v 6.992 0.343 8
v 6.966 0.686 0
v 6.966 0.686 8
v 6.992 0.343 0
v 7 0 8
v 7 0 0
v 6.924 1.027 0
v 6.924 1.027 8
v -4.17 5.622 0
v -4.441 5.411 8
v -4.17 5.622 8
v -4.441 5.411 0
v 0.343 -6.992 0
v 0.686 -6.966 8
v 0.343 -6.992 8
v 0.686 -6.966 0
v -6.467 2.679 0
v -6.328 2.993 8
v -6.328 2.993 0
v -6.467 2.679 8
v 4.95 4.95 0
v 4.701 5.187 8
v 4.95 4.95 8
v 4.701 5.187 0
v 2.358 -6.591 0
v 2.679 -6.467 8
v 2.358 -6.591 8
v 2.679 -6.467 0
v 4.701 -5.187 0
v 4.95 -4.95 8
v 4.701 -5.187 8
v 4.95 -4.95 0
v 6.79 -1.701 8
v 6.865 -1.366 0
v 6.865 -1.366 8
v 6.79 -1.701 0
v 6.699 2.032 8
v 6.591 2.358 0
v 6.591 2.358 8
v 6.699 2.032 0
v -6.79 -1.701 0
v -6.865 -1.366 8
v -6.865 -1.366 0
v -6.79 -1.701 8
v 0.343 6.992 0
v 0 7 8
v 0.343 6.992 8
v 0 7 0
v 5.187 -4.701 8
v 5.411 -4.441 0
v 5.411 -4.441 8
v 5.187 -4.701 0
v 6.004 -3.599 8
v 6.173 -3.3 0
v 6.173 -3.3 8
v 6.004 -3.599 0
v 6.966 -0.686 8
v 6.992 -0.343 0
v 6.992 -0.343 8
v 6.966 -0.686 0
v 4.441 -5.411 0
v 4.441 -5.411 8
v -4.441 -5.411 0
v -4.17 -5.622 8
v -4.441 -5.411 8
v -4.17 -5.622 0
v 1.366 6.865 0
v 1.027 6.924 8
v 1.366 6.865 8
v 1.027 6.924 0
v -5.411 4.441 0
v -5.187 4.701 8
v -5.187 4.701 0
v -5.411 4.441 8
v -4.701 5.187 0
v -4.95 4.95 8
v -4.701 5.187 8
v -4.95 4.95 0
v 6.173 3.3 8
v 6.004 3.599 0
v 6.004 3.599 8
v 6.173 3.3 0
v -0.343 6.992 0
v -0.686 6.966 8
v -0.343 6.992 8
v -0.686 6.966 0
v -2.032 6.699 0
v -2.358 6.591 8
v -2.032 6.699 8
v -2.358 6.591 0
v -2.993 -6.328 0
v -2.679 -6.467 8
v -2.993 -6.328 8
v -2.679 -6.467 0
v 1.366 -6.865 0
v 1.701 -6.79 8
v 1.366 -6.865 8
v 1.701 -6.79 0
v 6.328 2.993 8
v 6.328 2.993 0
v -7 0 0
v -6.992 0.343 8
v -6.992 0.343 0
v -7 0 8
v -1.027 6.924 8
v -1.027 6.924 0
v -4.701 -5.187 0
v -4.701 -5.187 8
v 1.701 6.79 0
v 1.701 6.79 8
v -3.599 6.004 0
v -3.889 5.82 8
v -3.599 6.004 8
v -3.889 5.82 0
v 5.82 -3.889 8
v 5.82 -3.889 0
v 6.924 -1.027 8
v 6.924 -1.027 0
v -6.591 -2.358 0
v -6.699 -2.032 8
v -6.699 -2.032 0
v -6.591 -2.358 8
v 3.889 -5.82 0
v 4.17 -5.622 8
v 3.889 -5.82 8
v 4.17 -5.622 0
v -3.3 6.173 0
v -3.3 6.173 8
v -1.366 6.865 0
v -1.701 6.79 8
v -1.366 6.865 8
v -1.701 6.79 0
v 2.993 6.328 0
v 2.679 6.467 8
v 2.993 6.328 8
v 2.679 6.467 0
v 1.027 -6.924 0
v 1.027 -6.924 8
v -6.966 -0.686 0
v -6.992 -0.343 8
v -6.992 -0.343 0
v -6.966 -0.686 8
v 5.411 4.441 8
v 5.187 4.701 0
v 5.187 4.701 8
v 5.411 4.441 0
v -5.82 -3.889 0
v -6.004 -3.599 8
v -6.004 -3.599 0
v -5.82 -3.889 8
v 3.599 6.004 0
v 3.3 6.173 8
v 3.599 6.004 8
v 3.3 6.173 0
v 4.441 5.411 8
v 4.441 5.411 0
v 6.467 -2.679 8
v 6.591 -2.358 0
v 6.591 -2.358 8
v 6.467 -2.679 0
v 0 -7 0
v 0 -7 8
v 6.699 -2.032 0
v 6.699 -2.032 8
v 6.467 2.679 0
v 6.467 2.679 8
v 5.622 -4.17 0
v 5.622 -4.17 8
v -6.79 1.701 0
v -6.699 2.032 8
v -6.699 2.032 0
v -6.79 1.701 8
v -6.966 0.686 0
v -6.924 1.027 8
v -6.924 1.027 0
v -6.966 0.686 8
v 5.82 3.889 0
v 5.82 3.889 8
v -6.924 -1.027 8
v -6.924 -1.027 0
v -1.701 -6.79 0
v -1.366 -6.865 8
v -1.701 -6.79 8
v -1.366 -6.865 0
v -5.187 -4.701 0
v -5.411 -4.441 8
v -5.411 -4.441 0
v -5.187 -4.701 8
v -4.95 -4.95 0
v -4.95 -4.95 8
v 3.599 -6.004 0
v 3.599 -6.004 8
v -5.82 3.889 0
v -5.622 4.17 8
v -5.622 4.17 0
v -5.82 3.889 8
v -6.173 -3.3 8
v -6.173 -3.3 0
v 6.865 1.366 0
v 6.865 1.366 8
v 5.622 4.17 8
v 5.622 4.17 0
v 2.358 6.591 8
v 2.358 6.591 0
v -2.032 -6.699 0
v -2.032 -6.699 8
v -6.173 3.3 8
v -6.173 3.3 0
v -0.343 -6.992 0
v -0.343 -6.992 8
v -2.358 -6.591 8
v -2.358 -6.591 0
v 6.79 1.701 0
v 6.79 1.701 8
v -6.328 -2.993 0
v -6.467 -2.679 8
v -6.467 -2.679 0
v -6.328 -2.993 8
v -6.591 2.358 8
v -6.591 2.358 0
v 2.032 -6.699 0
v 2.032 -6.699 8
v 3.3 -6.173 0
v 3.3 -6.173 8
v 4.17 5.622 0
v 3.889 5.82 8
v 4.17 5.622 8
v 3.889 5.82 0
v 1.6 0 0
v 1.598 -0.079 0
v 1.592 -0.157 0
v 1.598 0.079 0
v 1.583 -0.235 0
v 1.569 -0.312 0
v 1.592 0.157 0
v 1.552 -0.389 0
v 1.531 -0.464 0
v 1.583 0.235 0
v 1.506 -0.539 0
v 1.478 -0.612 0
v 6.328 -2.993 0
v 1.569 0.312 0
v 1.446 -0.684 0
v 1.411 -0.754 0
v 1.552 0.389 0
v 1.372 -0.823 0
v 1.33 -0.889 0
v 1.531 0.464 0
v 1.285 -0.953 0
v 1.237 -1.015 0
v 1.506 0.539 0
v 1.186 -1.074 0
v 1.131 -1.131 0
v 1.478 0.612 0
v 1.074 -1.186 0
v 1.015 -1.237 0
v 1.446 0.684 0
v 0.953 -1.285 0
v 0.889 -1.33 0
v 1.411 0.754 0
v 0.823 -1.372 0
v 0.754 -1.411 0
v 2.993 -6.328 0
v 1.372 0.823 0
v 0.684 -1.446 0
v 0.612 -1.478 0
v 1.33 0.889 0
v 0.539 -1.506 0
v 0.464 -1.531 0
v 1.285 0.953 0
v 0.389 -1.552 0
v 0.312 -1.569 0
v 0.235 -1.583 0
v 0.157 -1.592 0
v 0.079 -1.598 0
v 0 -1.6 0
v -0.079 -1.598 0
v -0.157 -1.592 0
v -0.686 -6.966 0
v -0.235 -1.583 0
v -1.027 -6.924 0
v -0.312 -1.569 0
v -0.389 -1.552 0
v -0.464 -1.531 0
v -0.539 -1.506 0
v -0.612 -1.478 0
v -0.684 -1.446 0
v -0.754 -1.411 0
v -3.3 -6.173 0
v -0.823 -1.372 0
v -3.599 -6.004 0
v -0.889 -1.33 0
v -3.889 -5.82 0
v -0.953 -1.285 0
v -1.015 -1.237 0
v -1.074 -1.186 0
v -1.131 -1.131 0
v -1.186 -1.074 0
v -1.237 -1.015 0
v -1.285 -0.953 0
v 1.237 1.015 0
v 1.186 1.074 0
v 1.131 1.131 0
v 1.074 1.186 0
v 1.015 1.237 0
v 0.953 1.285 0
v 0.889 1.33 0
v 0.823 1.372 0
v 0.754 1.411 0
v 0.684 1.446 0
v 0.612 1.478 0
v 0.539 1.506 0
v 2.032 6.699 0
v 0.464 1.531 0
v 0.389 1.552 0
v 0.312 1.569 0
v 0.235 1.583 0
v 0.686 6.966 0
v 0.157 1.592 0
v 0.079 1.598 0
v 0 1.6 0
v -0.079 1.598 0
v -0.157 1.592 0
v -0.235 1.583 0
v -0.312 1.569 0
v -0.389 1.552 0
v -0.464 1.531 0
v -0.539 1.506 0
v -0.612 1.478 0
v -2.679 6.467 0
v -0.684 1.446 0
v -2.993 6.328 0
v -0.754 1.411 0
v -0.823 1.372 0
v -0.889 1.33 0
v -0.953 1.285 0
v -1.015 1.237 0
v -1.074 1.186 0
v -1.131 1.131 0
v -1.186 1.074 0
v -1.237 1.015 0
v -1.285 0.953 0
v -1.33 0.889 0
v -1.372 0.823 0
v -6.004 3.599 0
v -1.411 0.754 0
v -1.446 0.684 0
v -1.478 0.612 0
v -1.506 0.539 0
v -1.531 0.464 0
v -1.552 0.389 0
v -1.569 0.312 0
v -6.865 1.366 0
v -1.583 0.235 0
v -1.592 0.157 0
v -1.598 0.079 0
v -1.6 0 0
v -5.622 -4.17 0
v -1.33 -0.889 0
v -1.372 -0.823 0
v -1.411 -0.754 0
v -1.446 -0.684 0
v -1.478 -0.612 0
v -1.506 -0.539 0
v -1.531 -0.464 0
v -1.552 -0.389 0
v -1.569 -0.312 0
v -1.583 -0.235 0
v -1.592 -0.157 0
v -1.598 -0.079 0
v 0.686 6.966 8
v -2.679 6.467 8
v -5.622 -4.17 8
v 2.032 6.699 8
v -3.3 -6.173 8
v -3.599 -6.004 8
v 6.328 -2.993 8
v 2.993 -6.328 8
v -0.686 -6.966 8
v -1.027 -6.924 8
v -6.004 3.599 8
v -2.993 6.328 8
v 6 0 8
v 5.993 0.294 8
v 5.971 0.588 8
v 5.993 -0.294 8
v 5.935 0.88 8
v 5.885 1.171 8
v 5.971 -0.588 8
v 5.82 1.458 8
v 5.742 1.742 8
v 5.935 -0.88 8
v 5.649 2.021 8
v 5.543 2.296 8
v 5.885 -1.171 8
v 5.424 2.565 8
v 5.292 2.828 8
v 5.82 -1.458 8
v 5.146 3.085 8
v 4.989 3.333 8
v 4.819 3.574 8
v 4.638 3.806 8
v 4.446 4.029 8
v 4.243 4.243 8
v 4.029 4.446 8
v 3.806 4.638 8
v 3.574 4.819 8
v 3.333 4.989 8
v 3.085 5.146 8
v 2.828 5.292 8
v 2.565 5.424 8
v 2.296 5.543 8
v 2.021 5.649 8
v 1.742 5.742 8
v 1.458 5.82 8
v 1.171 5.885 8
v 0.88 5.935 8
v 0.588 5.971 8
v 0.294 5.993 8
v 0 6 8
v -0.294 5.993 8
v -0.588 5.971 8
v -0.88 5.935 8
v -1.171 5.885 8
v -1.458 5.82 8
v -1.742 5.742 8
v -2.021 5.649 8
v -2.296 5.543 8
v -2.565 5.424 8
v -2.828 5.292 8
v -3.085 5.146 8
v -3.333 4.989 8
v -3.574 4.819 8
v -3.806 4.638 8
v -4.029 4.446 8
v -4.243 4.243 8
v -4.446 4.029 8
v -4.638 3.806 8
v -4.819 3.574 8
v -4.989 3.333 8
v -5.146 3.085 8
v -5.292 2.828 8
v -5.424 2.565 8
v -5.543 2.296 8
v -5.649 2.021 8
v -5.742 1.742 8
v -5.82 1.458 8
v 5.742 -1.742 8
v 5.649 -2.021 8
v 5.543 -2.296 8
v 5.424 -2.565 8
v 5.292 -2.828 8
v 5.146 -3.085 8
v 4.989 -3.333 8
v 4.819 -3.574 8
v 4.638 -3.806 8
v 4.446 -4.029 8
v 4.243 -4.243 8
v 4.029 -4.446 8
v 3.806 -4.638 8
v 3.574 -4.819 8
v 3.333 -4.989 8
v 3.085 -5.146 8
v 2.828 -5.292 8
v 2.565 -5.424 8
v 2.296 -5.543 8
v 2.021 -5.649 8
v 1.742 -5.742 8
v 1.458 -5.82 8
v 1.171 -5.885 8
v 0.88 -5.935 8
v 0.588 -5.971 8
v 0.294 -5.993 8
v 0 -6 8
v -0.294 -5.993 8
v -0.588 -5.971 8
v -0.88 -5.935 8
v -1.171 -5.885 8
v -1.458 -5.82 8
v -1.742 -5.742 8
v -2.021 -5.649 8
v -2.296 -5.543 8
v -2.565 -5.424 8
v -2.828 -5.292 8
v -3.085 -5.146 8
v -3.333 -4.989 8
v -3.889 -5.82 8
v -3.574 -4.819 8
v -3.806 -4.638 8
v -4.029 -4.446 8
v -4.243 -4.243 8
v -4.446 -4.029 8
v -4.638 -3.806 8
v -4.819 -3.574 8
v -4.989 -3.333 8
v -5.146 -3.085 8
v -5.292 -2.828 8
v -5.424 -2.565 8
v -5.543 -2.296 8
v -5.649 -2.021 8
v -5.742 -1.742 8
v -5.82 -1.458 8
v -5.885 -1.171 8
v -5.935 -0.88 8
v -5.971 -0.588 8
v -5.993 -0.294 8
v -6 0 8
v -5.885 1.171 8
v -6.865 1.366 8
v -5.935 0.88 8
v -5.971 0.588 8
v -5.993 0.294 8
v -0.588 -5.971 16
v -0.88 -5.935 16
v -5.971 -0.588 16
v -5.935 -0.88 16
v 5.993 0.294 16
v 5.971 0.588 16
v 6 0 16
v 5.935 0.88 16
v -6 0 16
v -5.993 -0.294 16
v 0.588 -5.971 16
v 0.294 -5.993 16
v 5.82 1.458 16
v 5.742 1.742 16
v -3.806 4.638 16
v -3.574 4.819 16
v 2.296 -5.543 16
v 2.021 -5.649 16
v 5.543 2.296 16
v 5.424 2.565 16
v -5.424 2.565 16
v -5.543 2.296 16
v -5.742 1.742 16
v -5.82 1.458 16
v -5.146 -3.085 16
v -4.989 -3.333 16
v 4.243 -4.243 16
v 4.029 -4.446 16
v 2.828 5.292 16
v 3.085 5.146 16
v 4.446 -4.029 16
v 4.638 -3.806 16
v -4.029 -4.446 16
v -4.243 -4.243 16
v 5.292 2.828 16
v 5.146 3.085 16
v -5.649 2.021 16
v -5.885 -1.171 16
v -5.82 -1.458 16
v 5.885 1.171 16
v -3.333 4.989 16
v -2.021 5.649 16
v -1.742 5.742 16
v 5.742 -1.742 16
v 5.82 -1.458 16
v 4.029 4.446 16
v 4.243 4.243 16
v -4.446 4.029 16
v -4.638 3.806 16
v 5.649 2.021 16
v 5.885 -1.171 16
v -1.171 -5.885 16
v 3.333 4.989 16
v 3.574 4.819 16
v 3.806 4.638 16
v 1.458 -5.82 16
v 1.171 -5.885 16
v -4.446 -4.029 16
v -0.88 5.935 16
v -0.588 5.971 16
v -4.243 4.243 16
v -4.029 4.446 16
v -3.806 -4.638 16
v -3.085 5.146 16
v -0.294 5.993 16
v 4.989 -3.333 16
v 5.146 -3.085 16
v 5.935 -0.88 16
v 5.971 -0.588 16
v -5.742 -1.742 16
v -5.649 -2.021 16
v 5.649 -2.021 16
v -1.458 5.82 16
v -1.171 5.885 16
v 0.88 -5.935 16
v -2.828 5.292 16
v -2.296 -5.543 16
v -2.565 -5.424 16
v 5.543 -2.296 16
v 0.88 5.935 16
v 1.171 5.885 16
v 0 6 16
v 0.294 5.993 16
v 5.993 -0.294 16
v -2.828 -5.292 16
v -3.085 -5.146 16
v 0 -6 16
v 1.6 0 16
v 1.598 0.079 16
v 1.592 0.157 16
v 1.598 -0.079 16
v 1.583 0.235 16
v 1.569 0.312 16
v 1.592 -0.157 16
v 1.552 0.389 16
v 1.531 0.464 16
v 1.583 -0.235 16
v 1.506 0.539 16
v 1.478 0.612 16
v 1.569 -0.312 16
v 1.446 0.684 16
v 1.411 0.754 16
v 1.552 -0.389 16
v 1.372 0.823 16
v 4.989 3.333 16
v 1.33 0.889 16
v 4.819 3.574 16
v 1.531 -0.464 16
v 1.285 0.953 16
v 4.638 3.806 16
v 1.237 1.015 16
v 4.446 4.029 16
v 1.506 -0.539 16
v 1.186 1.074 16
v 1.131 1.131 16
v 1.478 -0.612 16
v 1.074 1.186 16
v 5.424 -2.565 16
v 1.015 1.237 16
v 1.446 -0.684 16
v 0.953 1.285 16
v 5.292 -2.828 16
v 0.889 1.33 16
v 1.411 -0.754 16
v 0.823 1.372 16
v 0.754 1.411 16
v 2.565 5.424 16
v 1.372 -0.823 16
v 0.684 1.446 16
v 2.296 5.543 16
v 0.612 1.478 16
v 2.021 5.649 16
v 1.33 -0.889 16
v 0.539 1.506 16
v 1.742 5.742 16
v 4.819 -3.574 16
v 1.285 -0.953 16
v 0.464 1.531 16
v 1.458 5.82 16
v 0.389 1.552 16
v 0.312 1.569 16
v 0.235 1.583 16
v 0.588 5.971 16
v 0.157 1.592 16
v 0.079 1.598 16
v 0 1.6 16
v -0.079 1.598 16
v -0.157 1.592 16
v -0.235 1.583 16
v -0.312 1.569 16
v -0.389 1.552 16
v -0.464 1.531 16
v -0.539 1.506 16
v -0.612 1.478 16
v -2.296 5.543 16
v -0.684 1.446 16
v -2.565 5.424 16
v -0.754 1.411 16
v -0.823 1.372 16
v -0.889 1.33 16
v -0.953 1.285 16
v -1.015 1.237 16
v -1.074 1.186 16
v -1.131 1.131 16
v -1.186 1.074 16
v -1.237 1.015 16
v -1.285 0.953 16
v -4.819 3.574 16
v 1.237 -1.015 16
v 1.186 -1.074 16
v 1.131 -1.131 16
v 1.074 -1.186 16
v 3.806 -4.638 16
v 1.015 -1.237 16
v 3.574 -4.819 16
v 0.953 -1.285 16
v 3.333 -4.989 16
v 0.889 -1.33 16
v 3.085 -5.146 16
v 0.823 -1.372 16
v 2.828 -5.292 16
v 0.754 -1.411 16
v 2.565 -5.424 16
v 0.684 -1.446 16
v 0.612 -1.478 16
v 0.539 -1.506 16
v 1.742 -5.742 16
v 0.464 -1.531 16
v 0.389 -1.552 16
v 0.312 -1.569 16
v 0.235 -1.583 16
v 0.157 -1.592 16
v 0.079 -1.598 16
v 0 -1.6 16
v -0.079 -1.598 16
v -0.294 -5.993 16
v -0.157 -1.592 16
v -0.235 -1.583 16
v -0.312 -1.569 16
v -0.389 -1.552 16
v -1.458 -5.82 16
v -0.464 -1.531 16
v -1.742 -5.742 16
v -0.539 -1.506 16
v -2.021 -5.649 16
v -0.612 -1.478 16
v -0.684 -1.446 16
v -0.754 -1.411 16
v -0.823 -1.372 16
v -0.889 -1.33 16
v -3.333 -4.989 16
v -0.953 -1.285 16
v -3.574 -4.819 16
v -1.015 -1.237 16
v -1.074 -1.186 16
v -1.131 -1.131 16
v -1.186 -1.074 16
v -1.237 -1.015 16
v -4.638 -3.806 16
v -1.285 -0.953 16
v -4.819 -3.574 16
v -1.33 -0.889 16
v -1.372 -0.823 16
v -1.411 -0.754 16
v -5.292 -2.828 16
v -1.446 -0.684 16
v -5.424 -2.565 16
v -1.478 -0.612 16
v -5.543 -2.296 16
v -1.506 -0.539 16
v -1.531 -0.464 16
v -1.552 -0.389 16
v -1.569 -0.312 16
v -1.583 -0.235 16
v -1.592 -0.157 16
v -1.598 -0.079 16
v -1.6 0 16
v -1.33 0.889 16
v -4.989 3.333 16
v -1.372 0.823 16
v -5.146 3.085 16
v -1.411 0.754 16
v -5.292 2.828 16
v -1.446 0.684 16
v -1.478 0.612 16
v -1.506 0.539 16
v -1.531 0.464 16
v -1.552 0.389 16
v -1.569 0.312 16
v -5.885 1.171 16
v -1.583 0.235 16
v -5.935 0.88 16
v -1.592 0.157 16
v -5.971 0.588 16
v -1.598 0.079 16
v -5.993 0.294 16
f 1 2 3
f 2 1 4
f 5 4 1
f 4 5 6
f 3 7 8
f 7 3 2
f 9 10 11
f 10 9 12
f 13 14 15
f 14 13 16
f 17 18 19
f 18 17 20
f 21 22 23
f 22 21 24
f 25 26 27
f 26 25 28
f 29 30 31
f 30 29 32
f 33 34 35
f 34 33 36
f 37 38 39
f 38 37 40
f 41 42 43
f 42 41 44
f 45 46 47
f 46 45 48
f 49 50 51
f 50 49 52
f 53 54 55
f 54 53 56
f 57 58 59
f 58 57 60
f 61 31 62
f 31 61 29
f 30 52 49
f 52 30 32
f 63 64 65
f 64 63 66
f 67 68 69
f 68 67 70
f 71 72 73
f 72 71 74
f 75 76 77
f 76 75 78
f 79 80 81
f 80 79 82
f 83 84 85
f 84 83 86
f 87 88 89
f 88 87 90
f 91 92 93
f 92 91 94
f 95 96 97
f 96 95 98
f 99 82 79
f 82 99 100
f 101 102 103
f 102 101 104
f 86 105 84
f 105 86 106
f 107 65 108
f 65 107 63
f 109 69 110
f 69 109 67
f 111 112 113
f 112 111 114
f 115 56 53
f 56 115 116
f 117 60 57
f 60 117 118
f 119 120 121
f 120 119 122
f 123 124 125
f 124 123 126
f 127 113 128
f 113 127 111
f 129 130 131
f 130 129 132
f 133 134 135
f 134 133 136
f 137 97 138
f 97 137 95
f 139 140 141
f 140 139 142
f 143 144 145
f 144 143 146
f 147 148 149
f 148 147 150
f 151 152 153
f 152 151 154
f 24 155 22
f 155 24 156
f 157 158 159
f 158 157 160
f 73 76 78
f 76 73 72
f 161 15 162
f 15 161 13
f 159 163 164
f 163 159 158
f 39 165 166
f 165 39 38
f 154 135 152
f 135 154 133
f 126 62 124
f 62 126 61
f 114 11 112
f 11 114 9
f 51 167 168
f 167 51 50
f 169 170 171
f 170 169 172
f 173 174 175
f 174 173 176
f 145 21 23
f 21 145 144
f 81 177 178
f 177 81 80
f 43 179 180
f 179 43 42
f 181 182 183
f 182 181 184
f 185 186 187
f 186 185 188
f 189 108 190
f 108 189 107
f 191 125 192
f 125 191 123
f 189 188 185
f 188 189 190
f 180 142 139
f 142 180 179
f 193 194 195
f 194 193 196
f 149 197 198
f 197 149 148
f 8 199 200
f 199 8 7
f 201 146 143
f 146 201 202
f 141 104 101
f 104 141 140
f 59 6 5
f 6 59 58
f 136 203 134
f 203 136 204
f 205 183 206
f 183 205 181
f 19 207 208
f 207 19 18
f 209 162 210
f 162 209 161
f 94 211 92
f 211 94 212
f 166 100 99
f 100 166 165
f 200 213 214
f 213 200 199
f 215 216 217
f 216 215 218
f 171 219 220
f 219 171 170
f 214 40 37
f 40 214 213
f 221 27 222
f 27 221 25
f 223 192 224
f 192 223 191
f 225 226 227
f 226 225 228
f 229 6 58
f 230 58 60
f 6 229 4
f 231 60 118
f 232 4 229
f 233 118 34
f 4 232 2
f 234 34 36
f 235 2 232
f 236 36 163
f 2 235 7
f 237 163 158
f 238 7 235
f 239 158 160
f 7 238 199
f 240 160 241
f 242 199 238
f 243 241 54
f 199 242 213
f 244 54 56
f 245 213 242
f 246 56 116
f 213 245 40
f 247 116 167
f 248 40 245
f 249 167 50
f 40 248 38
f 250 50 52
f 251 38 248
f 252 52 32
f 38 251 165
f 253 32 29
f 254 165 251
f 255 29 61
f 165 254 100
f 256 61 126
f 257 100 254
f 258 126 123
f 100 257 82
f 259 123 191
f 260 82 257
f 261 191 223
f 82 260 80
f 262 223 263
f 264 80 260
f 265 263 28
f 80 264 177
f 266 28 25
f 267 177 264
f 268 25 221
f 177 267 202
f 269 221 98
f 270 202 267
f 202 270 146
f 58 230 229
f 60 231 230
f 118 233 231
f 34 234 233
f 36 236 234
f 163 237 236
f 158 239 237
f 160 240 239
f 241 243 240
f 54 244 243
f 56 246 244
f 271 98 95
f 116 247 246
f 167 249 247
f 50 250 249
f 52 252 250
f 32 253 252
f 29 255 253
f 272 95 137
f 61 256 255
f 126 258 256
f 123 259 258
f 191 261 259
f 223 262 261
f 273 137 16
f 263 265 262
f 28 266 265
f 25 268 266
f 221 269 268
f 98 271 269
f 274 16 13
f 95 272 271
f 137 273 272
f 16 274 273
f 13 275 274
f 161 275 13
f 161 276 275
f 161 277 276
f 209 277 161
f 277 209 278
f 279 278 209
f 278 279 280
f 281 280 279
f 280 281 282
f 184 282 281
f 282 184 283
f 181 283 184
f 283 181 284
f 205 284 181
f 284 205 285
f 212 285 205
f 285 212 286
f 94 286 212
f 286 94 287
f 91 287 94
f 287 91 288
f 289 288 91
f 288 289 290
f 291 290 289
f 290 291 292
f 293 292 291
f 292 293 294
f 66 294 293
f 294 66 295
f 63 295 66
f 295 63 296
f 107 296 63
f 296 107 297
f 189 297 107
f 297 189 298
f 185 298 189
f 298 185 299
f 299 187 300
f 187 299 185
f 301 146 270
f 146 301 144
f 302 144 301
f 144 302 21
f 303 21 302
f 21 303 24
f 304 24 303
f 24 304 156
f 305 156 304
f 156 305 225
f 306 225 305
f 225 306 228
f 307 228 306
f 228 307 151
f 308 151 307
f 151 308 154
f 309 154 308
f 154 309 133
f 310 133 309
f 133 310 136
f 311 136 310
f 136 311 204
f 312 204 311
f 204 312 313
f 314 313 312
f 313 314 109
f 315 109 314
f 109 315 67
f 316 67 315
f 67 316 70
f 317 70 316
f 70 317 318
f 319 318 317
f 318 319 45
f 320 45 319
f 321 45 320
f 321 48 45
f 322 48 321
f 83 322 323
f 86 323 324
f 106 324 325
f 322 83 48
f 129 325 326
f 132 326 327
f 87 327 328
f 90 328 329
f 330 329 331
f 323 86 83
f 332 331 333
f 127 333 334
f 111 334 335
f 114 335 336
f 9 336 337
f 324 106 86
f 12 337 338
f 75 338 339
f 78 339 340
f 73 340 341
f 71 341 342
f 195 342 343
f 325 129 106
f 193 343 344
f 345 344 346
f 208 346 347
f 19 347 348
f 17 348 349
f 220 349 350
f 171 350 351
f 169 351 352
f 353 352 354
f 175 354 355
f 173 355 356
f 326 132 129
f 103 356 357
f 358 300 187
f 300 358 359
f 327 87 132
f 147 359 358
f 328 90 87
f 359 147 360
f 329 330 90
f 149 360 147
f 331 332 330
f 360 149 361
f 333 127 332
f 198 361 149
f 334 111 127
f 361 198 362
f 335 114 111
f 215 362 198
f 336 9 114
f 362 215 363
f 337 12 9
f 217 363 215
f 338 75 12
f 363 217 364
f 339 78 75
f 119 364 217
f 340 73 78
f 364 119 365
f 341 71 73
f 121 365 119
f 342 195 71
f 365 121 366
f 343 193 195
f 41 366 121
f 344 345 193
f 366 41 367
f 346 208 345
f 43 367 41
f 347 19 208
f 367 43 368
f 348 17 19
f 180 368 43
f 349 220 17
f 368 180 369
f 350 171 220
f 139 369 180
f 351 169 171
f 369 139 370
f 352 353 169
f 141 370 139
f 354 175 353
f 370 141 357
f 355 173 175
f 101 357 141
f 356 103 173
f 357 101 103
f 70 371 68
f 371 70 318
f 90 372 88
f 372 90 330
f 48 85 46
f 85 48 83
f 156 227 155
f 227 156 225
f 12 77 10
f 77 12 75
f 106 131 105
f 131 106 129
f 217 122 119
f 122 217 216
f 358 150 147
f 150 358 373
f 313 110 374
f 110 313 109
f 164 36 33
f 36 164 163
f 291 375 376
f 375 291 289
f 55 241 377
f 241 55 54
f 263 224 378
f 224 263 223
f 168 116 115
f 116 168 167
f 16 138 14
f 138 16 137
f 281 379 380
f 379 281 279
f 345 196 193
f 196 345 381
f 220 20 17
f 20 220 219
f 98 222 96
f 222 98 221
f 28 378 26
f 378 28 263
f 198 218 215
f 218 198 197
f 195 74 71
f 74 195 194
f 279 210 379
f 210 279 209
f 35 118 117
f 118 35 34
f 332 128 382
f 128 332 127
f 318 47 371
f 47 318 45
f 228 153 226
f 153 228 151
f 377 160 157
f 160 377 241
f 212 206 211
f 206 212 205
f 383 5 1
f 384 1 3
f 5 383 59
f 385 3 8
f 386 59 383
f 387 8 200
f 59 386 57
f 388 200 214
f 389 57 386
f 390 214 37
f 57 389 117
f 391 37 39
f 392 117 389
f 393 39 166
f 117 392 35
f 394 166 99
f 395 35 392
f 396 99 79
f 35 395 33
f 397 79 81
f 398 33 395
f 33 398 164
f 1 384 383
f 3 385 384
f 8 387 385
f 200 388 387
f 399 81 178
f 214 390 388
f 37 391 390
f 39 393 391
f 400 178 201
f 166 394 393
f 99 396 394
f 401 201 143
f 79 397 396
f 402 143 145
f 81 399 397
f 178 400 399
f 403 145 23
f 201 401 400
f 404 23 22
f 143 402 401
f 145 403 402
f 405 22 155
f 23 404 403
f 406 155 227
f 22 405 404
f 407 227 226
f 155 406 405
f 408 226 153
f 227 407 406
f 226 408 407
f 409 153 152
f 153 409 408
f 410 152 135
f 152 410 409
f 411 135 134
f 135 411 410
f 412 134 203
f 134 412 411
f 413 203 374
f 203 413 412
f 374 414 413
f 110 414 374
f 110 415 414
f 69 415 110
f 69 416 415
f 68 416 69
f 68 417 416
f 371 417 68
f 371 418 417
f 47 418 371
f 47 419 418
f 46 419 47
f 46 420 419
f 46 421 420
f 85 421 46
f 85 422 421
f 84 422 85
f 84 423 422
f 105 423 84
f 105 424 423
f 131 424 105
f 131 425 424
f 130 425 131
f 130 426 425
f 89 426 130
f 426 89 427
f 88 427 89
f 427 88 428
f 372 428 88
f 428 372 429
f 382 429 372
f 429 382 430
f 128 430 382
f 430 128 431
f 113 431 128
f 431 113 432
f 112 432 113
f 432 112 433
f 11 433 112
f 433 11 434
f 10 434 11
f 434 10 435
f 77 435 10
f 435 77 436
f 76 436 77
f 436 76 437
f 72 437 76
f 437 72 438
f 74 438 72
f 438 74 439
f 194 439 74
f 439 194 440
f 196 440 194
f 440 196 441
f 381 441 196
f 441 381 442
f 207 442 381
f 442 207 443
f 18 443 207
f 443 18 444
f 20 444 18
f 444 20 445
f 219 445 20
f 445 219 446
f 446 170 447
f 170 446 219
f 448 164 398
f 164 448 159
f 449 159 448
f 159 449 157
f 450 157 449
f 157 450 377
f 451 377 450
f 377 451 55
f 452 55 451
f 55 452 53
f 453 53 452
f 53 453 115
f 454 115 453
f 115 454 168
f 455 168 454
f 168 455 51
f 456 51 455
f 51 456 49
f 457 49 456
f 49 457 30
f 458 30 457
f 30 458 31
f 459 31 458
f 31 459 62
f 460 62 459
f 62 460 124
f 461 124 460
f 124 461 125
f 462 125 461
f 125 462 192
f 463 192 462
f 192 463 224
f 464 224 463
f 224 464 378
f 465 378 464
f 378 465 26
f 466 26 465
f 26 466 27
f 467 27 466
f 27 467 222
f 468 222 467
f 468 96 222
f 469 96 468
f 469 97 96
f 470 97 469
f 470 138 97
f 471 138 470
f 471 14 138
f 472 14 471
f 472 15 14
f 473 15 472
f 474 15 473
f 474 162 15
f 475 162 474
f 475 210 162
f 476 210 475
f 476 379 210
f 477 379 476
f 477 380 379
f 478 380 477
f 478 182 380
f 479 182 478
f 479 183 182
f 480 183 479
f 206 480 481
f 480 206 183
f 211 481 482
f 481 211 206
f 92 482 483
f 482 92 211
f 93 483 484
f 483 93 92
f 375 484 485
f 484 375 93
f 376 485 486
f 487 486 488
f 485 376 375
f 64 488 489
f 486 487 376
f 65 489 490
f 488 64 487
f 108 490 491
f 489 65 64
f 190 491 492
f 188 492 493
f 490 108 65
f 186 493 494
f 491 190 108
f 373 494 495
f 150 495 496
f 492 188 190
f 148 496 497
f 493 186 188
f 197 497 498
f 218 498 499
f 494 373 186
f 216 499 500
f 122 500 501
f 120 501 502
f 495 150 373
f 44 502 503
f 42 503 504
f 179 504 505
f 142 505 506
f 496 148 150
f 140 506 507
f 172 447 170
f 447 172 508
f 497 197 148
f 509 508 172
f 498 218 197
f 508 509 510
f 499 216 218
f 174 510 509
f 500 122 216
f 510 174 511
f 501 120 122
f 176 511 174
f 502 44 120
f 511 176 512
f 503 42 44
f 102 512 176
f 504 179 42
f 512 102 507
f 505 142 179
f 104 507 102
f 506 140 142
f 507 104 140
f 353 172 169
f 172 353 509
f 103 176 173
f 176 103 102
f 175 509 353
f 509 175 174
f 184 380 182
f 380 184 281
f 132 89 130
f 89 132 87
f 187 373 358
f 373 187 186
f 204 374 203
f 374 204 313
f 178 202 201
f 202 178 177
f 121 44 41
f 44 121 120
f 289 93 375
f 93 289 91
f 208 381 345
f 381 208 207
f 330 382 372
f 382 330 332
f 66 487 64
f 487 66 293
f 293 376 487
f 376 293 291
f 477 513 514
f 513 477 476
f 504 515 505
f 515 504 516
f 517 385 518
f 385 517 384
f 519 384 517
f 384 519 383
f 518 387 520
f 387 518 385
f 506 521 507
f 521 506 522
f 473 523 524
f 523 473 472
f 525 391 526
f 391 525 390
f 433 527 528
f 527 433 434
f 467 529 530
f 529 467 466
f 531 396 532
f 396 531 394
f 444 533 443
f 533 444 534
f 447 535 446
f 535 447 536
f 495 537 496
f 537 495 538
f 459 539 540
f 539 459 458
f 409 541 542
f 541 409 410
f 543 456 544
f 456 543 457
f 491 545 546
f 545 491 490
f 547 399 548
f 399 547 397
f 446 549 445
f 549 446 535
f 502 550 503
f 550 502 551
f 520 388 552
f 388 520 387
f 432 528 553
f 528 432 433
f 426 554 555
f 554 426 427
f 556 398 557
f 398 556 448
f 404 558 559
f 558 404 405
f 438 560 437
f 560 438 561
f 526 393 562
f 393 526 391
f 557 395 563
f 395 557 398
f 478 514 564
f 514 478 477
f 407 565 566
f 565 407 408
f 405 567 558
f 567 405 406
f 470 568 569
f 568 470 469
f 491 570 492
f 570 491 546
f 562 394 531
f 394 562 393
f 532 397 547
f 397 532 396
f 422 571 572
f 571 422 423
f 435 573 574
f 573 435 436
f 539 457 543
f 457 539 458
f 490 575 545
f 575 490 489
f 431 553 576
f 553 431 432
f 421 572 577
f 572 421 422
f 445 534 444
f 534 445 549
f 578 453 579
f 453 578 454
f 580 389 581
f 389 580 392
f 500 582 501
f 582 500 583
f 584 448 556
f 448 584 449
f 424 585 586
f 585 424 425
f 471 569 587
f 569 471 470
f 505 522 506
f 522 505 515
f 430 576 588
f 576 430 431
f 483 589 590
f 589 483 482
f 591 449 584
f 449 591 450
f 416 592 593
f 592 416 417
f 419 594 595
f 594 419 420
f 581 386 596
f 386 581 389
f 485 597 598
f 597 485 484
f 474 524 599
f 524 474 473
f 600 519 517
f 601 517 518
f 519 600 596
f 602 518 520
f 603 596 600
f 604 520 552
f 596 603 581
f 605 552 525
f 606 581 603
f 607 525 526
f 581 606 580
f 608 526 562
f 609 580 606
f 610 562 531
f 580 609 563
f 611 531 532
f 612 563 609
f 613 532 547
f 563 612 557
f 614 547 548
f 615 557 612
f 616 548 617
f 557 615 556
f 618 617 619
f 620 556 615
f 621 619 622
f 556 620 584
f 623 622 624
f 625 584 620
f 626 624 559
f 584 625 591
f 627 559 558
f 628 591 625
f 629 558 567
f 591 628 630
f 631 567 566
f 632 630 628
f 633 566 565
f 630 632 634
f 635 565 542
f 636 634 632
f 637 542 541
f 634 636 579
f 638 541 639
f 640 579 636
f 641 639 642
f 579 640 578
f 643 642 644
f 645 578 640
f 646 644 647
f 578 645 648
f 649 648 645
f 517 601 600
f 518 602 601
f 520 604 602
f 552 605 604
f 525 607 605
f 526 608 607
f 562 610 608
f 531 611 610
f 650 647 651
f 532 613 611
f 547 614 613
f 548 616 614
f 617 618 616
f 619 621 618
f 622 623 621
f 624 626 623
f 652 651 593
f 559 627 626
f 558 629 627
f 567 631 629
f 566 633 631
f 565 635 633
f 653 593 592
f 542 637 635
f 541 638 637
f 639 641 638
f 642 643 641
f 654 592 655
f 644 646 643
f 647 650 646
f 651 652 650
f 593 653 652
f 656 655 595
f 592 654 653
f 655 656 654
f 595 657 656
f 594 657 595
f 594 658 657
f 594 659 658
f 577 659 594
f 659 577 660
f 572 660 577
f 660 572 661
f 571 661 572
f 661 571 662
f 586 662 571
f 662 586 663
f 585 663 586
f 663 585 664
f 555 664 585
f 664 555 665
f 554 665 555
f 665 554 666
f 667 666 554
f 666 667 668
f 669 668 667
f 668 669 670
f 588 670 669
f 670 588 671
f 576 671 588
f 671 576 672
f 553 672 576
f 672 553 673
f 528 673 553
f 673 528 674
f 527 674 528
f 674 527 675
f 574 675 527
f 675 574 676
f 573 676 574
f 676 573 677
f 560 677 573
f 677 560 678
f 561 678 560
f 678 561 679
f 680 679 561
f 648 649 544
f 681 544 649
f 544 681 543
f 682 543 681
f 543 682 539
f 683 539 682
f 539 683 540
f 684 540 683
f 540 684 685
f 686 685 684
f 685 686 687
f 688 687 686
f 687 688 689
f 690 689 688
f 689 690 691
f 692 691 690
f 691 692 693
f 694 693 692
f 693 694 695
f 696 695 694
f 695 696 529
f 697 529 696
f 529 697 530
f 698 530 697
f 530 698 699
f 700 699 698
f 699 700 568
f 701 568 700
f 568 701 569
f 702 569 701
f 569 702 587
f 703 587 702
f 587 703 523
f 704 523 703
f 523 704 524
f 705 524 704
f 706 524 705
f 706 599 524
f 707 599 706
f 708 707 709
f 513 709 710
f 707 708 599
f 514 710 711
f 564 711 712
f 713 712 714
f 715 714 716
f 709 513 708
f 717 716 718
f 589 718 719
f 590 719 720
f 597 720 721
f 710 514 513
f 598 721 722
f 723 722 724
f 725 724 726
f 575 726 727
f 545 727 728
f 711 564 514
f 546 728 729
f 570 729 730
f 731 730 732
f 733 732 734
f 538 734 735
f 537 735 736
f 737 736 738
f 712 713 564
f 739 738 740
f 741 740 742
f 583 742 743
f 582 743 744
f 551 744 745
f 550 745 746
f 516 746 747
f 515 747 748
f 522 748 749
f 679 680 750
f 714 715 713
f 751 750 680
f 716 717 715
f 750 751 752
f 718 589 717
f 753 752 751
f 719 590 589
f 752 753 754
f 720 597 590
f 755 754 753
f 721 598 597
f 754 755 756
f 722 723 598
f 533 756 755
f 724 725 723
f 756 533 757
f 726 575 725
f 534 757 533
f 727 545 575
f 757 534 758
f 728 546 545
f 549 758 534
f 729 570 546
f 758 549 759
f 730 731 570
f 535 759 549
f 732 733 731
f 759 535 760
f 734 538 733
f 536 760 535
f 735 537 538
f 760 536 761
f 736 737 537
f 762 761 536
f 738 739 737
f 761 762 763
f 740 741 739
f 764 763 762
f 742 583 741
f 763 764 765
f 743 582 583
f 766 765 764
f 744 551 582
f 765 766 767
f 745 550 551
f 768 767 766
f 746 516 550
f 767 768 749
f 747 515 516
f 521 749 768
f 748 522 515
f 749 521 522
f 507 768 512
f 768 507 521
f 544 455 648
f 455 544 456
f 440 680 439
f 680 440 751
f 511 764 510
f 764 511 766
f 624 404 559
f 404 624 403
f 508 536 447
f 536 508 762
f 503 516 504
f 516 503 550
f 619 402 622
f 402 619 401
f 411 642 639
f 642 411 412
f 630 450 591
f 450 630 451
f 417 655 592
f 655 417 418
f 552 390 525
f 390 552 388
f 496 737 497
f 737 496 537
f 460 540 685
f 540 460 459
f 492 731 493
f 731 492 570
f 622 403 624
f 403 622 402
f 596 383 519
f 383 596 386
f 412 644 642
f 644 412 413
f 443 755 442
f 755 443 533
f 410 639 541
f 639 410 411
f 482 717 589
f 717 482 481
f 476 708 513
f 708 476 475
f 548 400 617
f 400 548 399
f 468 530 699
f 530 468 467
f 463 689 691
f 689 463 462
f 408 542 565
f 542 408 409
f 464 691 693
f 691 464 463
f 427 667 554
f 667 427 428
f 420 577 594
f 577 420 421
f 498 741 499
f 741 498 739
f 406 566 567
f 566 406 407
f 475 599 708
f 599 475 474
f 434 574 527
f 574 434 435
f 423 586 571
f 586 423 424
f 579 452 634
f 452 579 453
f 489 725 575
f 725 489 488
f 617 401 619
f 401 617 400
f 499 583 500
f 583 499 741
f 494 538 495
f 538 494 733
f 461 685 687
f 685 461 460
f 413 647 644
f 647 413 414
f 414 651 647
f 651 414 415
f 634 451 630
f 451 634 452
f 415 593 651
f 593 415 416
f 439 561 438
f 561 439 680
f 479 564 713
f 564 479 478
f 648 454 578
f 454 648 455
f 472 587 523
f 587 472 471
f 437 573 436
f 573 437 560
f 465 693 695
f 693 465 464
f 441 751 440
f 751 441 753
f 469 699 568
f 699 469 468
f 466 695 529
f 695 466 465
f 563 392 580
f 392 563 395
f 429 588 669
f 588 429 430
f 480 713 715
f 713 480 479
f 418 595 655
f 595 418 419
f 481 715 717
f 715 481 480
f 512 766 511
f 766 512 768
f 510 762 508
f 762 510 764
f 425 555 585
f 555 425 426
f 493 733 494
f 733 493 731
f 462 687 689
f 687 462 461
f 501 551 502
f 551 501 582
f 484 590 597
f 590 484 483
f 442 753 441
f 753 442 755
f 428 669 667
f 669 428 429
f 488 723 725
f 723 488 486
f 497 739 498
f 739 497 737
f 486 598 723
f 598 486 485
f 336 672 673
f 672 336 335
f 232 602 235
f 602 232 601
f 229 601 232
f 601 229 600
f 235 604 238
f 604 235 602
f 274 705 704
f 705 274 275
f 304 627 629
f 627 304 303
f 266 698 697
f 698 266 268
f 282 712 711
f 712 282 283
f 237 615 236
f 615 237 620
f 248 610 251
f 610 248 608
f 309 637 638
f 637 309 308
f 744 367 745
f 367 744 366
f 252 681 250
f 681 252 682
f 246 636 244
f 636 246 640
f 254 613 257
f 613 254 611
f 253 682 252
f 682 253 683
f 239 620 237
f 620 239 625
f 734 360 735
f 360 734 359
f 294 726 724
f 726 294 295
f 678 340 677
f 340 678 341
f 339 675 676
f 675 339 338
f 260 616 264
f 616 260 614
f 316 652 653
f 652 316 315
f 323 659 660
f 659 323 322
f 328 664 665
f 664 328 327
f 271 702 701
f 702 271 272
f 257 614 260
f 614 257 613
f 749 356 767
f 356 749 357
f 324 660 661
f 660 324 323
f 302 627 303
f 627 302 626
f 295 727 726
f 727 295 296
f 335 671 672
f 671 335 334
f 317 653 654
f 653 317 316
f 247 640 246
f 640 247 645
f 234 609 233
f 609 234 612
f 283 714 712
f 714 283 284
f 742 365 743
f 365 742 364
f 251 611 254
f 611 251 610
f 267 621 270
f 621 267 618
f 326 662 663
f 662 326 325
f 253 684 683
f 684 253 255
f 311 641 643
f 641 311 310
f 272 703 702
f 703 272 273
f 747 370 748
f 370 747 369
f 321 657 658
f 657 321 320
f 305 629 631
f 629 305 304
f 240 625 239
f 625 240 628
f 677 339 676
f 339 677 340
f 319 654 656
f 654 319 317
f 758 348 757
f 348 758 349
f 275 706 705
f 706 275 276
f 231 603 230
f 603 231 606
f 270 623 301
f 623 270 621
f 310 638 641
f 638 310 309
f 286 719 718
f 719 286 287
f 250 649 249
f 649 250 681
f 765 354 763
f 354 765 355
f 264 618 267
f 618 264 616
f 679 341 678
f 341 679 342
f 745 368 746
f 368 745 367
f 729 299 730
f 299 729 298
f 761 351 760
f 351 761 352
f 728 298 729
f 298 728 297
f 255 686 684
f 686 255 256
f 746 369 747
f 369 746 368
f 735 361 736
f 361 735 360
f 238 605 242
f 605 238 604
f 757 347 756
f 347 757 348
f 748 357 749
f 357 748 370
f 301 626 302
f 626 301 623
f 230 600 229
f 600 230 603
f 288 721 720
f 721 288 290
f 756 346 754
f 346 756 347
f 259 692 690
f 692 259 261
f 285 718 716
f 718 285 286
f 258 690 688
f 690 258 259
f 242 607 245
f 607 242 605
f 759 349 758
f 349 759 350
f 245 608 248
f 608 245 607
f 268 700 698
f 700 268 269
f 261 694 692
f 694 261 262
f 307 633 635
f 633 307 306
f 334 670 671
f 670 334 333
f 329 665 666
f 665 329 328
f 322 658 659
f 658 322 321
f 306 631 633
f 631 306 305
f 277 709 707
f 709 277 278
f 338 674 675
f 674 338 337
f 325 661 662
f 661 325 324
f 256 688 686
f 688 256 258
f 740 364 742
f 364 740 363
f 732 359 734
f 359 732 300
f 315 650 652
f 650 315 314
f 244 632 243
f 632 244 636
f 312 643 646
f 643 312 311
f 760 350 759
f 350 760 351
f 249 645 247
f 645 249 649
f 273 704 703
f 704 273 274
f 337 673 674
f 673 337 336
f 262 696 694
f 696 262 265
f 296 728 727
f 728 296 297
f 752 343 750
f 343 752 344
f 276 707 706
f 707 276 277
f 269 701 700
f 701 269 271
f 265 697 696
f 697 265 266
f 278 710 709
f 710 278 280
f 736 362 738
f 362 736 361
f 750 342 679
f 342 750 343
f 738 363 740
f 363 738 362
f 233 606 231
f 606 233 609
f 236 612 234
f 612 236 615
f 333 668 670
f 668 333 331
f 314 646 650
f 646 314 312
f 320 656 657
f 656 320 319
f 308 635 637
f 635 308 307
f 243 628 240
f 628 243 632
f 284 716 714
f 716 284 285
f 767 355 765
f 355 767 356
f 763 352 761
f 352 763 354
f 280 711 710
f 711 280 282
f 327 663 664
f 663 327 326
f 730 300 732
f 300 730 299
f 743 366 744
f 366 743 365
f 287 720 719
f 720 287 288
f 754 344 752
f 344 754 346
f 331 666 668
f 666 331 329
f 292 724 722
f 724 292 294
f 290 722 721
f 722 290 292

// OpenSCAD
// file: common.scad
eps = 0.01;
$fn= $preview ? 32 : 128;

x_carriage_width = 65;
y_carriage_depth = 50;

x_rod_spacing = 30;
x_rod_height = 40;
y_rod_spacing = 30;
y_rod_height = 48;

lin_bearing_OD_measured = 9.97;
lin_bearing_OD = lin_bearing_OD_measured + 0.2; // needs more clearance when 3D printing in XY plane
lin_bearing_length = 14.95;

rod_OD = 4.98;
rod_clr = 1;
rod_pressfit_horiz = 5.0; // a bit tight, but a little filing makes a good snug fit
x_rod_length = 215;
y_rod_length = 215;

M3_self_thread = 3.0; // for vertical (along 3D printer Z axis) holes only.
M3_pass_through = 3.2; // for vertical holes only
M3_self_thread_horiz = 2.6; // for horizontal (along 3D printer XY plane) holes only.

pulley_deck_height = 54;

pen_lifter_bolt_pattern_diameter = 25;

// LIN Engineering stepper 4118M-39D-01
stepper_bolt_pattern_diameter = 43.51;
stepper_axle_diameter = 4.98;
stepper_axle_length = 22;
stepper_body_width = 42.5;
stepper_body_depth = 42.5;
stepper_body_height = 39.6;
stepper_boss_diameter = 22;
stepper_boss_height = 2;
stepper_rear_axle_length = 8.5;

pulley_diameter = 11.81; // the effective diameter of the pulley. from highest points on teeth across (from a printed 20T pulley)
belt_thickness = 1.06; // the thickness of the belt, not including the teeth
// the belt wrapped around the pulley is 14.17mm in diameter
// larger than the 13.93 you'd expect from belt_thickness * 2 + pulley_diameter

inner_idler_spacing = 2*(pulley_diameter + belt_thickness); // the distance between the two inner idlers on the x carriage
outer_idler_spacing = 4*(pulley_diameter + belt_thickness); // the distance between the two outer idlers on the x carriage
outer_idler_offset = pulley_diameter; // how far forward the outer idlers are offset from the center line of the x axis
// main file
include <common.scad>;

base_dia = 14;
base_height = 8;
smooth_dia = 12;
smooth_height = 8;
bore_dia = 3.2;

difference() {
  union() {
    cylinder(h=base_height, d=base_dia);
    translate([0,0,base_height])
      cylinder(h=smooth_height, d=smooth_dia);
  }
  translate([0,0, -eps])
    cylinder(h=base_height+smooth_height+2*eps, d=bore_dia);
}
